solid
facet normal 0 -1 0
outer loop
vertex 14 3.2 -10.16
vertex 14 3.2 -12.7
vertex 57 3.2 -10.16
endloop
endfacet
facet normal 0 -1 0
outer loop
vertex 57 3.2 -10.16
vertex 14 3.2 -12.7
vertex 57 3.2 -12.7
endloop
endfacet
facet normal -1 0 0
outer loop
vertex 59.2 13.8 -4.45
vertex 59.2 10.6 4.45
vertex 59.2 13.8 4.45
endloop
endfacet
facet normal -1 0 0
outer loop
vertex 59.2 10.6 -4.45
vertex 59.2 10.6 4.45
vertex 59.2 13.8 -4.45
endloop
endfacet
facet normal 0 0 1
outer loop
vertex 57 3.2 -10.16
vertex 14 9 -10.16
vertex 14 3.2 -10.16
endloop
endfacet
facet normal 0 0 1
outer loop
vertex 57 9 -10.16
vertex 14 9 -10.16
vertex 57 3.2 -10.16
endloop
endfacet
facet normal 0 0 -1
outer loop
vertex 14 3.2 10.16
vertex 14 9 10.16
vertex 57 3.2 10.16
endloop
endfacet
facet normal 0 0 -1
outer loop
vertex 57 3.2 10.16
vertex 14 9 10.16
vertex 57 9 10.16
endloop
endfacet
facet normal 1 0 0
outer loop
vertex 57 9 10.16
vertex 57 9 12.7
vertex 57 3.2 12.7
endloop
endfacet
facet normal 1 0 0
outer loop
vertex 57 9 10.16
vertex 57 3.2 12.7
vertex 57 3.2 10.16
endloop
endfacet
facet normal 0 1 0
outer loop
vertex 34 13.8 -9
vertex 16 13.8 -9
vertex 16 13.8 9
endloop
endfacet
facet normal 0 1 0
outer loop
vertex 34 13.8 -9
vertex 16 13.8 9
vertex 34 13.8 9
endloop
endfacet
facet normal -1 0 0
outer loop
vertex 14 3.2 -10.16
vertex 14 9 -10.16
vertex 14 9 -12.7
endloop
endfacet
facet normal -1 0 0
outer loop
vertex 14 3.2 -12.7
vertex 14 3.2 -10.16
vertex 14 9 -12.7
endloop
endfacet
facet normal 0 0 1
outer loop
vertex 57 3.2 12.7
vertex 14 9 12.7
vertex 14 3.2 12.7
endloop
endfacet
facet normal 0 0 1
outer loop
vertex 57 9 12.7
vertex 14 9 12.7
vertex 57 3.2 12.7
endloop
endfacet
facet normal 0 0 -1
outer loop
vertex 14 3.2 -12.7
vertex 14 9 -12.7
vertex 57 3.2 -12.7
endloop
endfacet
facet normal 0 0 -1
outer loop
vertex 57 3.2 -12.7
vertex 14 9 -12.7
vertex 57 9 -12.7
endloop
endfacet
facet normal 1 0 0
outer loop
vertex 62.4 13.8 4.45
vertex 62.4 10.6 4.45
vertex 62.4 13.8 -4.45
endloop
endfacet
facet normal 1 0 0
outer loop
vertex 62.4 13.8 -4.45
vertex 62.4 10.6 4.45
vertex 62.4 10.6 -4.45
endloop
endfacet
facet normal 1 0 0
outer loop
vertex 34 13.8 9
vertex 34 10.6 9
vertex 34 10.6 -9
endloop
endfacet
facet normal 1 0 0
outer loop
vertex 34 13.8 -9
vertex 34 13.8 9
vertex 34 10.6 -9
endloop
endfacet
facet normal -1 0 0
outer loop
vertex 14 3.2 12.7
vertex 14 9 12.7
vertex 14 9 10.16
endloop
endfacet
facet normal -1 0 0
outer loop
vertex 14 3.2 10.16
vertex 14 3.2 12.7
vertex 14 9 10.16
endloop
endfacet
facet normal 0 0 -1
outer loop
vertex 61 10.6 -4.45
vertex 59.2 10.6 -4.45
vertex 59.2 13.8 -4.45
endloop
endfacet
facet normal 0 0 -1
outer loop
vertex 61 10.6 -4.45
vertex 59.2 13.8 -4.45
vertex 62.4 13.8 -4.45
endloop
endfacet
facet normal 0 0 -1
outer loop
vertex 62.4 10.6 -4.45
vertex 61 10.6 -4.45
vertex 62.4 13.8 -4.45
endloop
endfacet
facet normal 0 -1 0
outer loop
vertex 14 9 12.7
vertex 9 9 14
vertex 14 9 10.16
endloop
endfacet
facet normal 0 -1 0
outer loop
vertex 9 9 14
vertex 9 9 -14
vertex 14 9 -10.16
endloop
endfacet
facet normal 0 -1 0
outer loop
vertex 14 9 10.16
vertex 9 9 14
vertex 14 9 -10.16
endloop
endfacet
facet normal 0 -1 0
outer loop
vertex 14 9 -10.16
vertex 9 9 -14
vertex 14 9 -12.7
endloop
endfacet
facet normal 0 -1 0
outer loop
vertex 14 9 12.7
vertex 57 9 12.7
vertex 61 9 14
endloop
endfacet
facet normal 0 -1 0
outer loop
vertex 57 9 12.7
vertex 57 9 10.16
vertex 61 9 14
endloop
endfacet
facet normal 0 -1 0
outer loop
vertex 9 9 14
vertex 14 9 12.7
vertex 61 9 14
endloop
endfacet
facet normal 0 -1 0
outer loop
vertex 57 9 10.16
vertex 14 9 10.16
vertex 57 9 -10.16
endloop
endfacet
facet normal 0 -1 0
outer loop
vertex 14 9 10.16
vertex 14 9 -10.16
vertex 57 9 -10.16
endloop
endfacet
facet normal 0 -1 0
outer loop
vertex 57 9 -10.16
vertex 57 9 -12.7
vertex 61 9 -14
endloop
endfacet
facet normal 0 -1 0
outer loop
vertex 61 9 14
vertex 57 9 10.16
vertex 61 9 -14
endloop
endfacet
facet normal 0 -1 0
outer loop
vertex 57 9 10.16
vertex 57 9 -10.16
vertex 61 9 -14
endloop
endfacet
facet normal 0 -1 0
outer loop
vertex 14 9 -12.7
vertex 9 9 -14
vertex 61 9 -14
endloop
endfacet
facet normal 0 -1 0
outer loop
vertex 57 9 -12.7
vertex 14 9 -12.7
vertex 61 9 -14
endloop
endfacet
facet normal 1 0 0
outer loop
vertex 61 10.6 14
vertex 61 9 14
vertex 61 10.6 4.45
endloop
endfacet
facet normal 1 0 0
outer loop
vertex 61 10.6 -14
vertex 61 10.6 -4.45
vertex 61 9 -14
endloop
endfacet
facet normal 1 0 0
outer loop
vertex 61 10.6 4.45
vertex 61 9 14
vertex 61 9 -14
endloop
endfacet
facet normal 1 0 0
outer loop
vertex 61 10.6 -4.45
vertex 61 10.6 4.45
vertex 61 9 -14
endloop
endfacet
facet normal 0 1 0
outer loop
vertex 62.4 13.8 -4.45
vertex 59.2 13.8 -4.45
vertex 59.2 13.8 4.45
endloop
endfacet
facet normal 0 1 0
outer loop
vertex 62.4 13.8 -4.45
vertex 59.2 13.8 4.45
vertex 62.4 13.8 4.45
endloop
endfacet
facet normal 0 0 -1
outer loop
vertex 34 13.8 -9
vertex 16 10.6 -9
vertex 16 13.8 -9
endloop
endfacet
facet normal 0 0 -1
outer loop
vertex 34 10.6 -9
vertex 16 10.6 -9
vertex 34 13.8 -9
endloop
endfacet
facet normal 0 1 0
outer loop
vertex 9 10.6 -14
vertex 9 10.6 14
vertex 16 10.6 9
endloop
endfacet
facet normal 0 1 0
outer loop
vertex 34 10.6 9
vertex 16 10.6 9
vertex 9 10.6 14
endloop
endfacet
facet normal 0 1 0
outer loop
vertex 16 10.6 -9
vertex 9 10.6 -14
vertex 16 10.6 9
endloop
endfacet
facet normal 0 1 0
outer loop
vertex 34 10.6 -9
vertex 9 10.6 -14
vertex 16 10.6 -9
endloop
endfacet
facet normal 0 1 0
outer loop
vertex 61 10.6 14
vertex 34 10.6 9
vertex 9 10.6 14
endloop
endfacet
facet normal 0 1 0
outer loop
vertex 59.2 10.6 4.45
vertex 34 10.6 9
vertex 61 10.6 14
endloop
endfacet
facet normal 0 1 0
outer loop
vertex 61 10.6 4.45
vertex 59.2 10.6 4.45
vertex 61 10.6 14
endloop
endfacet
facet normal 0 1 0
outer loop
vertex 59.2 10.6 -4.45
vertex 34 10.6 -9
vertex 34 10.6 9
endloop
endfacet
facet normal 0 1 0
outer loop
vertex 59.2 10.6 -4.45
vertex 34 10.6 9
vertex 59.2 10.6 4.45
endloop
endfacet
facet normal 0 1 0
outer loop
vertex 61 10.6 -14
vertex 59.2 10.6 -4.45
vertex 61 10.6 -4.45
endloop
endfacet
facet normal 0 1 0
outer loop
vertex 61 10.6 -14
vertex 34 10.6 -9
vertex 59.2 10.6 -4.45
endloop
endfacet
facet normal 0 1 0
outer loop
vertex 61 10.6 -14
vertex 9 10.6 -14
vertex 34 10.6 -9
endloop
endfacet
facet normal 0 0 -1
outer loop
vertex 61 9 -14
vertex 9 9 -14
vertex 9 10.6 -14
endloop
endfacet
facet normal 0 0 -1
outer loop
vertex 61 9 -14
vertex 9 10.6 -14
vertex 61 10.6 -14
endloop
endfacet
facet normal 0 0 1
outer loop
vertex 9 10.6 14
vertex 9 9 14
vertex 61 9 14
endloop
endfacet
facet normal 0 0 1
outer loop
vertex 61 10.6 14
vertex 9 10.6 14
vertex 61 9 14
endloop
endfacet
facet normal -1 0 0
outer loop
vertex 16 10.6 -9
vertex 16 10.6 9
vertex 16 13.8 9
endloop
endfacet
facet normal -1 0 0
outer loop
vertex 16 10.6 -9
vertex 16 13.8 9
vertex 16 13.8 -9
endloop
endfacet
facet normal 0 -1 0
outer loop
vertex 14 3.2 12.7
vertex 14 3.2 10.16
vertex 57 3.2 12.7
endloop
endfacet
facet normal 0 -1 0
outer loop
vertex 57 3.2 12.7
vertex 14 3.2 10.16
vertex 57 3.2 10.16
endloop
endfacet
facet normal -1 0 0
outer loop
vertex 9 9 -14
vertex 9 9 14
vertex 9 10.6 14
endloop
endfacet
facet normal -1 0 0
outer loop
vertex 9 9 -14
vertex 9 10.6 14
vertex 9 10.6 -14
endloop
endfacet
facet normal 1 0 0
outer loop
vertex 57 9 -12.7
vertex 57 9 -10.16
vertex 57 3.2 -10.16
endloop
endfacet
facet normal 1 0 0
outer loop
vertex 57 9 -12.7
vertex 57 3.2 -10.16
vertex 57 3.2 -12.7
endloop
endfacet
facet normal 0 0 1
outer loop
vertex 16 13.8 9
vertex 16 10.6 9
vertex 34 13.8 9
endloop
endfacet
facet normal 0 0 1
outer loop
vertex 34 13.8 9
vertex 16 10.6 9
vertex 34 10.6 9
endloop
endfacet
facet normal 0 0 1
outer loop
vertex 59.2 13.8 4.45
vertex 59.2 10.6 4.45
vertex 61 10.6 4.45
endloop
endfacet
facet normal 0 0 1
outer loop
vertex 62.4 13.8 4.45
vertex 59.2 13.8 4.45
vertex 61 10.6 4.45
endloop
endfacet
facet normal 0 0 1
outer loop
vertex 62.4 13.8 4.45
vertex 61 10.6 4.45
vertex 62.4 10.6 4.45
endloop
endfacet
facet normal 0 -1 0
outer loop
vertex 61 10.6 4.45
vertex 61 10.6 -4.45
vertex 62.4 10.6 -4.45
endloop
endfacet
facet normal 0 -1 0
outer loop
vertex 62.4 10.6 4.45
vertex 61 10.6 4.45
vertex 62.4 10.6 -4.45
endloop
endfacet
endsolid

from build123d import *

# Parameters (mm, degrees)
SKETCH1_W           = 52
SKETCH1_H           = 28
BOSS_EXTRUDE1_DEPTH = 1.6
SKETCH2_W           = 18
SKETCH2_H           = 18
BOSS_EXTRUDE2_DEPTH = 3.2
SKETCH3_W           = 3.2
SKETCH3_H           = 8.9
BOSS_EXTRUDE3_DEPTH = 3.2
SKETCH4_W           = 43
SKETCH4_H           = 2.54
BOSS_EXTRUDE4_DEPTH = 5.8


with BuildPart() as part:
    # Sketch1 → Boss-Extrude1 (new body)
    with BuildSketch(Plane(origin=(0, 9, 0), x_dir=(1, 0, 0), z_dir=(0, 1, 0))):
        with Locations((35, 0)):
            Rectangle(SKETCH1_W, SKETCH1_H)
    extrude(amount=BOSS_EXTRUDE1_DEPTH)

    # Sketch2 → Boss-Extrude2 (add)
    with BuildSketch(Plane(origin=(0, 10.6, 0), x_dir=(1, 0, 0), z_dir=(0, 1, 0))):
        with Locations((25, 0)):
            Rectangle(SKETCH2_W, SKETCH2_H)
    extrude(amount=BOSS_EXTRUDE2_DEPTH)

    # Sketch3 → Boss-Extrude3 (add)
    with BuildSketch(Plane(origin=(0, 10.6, 0), x_dir=(1, 0, 0), z_dir=(0, 1, 0))):
        with Locations((60.8, 0)):
            Rectangle(SKETCH3_W, SKETCH3_H)
    extrude(amount=BOSS_EXTRUDE3_DEPTH)

    # Sketch4 → Boss-Extrude4 (add)
    with BuildSketch(Plane(origin=(0, 9, 0), x_dir=(1, 0, 0), z_dir=(0, 1, 0))):
        with Locations((35.5, 11.43)):
            Rectangle(SKETCH4_W, SKETCH4_H)
        with Locations((35.5, -11.43)):
            Rectangle(SKETCH4_W, SKETCH4_H)
    extrude(amount=-BOSS_EXTRUDE4_DEPTH)


solid = part.part
